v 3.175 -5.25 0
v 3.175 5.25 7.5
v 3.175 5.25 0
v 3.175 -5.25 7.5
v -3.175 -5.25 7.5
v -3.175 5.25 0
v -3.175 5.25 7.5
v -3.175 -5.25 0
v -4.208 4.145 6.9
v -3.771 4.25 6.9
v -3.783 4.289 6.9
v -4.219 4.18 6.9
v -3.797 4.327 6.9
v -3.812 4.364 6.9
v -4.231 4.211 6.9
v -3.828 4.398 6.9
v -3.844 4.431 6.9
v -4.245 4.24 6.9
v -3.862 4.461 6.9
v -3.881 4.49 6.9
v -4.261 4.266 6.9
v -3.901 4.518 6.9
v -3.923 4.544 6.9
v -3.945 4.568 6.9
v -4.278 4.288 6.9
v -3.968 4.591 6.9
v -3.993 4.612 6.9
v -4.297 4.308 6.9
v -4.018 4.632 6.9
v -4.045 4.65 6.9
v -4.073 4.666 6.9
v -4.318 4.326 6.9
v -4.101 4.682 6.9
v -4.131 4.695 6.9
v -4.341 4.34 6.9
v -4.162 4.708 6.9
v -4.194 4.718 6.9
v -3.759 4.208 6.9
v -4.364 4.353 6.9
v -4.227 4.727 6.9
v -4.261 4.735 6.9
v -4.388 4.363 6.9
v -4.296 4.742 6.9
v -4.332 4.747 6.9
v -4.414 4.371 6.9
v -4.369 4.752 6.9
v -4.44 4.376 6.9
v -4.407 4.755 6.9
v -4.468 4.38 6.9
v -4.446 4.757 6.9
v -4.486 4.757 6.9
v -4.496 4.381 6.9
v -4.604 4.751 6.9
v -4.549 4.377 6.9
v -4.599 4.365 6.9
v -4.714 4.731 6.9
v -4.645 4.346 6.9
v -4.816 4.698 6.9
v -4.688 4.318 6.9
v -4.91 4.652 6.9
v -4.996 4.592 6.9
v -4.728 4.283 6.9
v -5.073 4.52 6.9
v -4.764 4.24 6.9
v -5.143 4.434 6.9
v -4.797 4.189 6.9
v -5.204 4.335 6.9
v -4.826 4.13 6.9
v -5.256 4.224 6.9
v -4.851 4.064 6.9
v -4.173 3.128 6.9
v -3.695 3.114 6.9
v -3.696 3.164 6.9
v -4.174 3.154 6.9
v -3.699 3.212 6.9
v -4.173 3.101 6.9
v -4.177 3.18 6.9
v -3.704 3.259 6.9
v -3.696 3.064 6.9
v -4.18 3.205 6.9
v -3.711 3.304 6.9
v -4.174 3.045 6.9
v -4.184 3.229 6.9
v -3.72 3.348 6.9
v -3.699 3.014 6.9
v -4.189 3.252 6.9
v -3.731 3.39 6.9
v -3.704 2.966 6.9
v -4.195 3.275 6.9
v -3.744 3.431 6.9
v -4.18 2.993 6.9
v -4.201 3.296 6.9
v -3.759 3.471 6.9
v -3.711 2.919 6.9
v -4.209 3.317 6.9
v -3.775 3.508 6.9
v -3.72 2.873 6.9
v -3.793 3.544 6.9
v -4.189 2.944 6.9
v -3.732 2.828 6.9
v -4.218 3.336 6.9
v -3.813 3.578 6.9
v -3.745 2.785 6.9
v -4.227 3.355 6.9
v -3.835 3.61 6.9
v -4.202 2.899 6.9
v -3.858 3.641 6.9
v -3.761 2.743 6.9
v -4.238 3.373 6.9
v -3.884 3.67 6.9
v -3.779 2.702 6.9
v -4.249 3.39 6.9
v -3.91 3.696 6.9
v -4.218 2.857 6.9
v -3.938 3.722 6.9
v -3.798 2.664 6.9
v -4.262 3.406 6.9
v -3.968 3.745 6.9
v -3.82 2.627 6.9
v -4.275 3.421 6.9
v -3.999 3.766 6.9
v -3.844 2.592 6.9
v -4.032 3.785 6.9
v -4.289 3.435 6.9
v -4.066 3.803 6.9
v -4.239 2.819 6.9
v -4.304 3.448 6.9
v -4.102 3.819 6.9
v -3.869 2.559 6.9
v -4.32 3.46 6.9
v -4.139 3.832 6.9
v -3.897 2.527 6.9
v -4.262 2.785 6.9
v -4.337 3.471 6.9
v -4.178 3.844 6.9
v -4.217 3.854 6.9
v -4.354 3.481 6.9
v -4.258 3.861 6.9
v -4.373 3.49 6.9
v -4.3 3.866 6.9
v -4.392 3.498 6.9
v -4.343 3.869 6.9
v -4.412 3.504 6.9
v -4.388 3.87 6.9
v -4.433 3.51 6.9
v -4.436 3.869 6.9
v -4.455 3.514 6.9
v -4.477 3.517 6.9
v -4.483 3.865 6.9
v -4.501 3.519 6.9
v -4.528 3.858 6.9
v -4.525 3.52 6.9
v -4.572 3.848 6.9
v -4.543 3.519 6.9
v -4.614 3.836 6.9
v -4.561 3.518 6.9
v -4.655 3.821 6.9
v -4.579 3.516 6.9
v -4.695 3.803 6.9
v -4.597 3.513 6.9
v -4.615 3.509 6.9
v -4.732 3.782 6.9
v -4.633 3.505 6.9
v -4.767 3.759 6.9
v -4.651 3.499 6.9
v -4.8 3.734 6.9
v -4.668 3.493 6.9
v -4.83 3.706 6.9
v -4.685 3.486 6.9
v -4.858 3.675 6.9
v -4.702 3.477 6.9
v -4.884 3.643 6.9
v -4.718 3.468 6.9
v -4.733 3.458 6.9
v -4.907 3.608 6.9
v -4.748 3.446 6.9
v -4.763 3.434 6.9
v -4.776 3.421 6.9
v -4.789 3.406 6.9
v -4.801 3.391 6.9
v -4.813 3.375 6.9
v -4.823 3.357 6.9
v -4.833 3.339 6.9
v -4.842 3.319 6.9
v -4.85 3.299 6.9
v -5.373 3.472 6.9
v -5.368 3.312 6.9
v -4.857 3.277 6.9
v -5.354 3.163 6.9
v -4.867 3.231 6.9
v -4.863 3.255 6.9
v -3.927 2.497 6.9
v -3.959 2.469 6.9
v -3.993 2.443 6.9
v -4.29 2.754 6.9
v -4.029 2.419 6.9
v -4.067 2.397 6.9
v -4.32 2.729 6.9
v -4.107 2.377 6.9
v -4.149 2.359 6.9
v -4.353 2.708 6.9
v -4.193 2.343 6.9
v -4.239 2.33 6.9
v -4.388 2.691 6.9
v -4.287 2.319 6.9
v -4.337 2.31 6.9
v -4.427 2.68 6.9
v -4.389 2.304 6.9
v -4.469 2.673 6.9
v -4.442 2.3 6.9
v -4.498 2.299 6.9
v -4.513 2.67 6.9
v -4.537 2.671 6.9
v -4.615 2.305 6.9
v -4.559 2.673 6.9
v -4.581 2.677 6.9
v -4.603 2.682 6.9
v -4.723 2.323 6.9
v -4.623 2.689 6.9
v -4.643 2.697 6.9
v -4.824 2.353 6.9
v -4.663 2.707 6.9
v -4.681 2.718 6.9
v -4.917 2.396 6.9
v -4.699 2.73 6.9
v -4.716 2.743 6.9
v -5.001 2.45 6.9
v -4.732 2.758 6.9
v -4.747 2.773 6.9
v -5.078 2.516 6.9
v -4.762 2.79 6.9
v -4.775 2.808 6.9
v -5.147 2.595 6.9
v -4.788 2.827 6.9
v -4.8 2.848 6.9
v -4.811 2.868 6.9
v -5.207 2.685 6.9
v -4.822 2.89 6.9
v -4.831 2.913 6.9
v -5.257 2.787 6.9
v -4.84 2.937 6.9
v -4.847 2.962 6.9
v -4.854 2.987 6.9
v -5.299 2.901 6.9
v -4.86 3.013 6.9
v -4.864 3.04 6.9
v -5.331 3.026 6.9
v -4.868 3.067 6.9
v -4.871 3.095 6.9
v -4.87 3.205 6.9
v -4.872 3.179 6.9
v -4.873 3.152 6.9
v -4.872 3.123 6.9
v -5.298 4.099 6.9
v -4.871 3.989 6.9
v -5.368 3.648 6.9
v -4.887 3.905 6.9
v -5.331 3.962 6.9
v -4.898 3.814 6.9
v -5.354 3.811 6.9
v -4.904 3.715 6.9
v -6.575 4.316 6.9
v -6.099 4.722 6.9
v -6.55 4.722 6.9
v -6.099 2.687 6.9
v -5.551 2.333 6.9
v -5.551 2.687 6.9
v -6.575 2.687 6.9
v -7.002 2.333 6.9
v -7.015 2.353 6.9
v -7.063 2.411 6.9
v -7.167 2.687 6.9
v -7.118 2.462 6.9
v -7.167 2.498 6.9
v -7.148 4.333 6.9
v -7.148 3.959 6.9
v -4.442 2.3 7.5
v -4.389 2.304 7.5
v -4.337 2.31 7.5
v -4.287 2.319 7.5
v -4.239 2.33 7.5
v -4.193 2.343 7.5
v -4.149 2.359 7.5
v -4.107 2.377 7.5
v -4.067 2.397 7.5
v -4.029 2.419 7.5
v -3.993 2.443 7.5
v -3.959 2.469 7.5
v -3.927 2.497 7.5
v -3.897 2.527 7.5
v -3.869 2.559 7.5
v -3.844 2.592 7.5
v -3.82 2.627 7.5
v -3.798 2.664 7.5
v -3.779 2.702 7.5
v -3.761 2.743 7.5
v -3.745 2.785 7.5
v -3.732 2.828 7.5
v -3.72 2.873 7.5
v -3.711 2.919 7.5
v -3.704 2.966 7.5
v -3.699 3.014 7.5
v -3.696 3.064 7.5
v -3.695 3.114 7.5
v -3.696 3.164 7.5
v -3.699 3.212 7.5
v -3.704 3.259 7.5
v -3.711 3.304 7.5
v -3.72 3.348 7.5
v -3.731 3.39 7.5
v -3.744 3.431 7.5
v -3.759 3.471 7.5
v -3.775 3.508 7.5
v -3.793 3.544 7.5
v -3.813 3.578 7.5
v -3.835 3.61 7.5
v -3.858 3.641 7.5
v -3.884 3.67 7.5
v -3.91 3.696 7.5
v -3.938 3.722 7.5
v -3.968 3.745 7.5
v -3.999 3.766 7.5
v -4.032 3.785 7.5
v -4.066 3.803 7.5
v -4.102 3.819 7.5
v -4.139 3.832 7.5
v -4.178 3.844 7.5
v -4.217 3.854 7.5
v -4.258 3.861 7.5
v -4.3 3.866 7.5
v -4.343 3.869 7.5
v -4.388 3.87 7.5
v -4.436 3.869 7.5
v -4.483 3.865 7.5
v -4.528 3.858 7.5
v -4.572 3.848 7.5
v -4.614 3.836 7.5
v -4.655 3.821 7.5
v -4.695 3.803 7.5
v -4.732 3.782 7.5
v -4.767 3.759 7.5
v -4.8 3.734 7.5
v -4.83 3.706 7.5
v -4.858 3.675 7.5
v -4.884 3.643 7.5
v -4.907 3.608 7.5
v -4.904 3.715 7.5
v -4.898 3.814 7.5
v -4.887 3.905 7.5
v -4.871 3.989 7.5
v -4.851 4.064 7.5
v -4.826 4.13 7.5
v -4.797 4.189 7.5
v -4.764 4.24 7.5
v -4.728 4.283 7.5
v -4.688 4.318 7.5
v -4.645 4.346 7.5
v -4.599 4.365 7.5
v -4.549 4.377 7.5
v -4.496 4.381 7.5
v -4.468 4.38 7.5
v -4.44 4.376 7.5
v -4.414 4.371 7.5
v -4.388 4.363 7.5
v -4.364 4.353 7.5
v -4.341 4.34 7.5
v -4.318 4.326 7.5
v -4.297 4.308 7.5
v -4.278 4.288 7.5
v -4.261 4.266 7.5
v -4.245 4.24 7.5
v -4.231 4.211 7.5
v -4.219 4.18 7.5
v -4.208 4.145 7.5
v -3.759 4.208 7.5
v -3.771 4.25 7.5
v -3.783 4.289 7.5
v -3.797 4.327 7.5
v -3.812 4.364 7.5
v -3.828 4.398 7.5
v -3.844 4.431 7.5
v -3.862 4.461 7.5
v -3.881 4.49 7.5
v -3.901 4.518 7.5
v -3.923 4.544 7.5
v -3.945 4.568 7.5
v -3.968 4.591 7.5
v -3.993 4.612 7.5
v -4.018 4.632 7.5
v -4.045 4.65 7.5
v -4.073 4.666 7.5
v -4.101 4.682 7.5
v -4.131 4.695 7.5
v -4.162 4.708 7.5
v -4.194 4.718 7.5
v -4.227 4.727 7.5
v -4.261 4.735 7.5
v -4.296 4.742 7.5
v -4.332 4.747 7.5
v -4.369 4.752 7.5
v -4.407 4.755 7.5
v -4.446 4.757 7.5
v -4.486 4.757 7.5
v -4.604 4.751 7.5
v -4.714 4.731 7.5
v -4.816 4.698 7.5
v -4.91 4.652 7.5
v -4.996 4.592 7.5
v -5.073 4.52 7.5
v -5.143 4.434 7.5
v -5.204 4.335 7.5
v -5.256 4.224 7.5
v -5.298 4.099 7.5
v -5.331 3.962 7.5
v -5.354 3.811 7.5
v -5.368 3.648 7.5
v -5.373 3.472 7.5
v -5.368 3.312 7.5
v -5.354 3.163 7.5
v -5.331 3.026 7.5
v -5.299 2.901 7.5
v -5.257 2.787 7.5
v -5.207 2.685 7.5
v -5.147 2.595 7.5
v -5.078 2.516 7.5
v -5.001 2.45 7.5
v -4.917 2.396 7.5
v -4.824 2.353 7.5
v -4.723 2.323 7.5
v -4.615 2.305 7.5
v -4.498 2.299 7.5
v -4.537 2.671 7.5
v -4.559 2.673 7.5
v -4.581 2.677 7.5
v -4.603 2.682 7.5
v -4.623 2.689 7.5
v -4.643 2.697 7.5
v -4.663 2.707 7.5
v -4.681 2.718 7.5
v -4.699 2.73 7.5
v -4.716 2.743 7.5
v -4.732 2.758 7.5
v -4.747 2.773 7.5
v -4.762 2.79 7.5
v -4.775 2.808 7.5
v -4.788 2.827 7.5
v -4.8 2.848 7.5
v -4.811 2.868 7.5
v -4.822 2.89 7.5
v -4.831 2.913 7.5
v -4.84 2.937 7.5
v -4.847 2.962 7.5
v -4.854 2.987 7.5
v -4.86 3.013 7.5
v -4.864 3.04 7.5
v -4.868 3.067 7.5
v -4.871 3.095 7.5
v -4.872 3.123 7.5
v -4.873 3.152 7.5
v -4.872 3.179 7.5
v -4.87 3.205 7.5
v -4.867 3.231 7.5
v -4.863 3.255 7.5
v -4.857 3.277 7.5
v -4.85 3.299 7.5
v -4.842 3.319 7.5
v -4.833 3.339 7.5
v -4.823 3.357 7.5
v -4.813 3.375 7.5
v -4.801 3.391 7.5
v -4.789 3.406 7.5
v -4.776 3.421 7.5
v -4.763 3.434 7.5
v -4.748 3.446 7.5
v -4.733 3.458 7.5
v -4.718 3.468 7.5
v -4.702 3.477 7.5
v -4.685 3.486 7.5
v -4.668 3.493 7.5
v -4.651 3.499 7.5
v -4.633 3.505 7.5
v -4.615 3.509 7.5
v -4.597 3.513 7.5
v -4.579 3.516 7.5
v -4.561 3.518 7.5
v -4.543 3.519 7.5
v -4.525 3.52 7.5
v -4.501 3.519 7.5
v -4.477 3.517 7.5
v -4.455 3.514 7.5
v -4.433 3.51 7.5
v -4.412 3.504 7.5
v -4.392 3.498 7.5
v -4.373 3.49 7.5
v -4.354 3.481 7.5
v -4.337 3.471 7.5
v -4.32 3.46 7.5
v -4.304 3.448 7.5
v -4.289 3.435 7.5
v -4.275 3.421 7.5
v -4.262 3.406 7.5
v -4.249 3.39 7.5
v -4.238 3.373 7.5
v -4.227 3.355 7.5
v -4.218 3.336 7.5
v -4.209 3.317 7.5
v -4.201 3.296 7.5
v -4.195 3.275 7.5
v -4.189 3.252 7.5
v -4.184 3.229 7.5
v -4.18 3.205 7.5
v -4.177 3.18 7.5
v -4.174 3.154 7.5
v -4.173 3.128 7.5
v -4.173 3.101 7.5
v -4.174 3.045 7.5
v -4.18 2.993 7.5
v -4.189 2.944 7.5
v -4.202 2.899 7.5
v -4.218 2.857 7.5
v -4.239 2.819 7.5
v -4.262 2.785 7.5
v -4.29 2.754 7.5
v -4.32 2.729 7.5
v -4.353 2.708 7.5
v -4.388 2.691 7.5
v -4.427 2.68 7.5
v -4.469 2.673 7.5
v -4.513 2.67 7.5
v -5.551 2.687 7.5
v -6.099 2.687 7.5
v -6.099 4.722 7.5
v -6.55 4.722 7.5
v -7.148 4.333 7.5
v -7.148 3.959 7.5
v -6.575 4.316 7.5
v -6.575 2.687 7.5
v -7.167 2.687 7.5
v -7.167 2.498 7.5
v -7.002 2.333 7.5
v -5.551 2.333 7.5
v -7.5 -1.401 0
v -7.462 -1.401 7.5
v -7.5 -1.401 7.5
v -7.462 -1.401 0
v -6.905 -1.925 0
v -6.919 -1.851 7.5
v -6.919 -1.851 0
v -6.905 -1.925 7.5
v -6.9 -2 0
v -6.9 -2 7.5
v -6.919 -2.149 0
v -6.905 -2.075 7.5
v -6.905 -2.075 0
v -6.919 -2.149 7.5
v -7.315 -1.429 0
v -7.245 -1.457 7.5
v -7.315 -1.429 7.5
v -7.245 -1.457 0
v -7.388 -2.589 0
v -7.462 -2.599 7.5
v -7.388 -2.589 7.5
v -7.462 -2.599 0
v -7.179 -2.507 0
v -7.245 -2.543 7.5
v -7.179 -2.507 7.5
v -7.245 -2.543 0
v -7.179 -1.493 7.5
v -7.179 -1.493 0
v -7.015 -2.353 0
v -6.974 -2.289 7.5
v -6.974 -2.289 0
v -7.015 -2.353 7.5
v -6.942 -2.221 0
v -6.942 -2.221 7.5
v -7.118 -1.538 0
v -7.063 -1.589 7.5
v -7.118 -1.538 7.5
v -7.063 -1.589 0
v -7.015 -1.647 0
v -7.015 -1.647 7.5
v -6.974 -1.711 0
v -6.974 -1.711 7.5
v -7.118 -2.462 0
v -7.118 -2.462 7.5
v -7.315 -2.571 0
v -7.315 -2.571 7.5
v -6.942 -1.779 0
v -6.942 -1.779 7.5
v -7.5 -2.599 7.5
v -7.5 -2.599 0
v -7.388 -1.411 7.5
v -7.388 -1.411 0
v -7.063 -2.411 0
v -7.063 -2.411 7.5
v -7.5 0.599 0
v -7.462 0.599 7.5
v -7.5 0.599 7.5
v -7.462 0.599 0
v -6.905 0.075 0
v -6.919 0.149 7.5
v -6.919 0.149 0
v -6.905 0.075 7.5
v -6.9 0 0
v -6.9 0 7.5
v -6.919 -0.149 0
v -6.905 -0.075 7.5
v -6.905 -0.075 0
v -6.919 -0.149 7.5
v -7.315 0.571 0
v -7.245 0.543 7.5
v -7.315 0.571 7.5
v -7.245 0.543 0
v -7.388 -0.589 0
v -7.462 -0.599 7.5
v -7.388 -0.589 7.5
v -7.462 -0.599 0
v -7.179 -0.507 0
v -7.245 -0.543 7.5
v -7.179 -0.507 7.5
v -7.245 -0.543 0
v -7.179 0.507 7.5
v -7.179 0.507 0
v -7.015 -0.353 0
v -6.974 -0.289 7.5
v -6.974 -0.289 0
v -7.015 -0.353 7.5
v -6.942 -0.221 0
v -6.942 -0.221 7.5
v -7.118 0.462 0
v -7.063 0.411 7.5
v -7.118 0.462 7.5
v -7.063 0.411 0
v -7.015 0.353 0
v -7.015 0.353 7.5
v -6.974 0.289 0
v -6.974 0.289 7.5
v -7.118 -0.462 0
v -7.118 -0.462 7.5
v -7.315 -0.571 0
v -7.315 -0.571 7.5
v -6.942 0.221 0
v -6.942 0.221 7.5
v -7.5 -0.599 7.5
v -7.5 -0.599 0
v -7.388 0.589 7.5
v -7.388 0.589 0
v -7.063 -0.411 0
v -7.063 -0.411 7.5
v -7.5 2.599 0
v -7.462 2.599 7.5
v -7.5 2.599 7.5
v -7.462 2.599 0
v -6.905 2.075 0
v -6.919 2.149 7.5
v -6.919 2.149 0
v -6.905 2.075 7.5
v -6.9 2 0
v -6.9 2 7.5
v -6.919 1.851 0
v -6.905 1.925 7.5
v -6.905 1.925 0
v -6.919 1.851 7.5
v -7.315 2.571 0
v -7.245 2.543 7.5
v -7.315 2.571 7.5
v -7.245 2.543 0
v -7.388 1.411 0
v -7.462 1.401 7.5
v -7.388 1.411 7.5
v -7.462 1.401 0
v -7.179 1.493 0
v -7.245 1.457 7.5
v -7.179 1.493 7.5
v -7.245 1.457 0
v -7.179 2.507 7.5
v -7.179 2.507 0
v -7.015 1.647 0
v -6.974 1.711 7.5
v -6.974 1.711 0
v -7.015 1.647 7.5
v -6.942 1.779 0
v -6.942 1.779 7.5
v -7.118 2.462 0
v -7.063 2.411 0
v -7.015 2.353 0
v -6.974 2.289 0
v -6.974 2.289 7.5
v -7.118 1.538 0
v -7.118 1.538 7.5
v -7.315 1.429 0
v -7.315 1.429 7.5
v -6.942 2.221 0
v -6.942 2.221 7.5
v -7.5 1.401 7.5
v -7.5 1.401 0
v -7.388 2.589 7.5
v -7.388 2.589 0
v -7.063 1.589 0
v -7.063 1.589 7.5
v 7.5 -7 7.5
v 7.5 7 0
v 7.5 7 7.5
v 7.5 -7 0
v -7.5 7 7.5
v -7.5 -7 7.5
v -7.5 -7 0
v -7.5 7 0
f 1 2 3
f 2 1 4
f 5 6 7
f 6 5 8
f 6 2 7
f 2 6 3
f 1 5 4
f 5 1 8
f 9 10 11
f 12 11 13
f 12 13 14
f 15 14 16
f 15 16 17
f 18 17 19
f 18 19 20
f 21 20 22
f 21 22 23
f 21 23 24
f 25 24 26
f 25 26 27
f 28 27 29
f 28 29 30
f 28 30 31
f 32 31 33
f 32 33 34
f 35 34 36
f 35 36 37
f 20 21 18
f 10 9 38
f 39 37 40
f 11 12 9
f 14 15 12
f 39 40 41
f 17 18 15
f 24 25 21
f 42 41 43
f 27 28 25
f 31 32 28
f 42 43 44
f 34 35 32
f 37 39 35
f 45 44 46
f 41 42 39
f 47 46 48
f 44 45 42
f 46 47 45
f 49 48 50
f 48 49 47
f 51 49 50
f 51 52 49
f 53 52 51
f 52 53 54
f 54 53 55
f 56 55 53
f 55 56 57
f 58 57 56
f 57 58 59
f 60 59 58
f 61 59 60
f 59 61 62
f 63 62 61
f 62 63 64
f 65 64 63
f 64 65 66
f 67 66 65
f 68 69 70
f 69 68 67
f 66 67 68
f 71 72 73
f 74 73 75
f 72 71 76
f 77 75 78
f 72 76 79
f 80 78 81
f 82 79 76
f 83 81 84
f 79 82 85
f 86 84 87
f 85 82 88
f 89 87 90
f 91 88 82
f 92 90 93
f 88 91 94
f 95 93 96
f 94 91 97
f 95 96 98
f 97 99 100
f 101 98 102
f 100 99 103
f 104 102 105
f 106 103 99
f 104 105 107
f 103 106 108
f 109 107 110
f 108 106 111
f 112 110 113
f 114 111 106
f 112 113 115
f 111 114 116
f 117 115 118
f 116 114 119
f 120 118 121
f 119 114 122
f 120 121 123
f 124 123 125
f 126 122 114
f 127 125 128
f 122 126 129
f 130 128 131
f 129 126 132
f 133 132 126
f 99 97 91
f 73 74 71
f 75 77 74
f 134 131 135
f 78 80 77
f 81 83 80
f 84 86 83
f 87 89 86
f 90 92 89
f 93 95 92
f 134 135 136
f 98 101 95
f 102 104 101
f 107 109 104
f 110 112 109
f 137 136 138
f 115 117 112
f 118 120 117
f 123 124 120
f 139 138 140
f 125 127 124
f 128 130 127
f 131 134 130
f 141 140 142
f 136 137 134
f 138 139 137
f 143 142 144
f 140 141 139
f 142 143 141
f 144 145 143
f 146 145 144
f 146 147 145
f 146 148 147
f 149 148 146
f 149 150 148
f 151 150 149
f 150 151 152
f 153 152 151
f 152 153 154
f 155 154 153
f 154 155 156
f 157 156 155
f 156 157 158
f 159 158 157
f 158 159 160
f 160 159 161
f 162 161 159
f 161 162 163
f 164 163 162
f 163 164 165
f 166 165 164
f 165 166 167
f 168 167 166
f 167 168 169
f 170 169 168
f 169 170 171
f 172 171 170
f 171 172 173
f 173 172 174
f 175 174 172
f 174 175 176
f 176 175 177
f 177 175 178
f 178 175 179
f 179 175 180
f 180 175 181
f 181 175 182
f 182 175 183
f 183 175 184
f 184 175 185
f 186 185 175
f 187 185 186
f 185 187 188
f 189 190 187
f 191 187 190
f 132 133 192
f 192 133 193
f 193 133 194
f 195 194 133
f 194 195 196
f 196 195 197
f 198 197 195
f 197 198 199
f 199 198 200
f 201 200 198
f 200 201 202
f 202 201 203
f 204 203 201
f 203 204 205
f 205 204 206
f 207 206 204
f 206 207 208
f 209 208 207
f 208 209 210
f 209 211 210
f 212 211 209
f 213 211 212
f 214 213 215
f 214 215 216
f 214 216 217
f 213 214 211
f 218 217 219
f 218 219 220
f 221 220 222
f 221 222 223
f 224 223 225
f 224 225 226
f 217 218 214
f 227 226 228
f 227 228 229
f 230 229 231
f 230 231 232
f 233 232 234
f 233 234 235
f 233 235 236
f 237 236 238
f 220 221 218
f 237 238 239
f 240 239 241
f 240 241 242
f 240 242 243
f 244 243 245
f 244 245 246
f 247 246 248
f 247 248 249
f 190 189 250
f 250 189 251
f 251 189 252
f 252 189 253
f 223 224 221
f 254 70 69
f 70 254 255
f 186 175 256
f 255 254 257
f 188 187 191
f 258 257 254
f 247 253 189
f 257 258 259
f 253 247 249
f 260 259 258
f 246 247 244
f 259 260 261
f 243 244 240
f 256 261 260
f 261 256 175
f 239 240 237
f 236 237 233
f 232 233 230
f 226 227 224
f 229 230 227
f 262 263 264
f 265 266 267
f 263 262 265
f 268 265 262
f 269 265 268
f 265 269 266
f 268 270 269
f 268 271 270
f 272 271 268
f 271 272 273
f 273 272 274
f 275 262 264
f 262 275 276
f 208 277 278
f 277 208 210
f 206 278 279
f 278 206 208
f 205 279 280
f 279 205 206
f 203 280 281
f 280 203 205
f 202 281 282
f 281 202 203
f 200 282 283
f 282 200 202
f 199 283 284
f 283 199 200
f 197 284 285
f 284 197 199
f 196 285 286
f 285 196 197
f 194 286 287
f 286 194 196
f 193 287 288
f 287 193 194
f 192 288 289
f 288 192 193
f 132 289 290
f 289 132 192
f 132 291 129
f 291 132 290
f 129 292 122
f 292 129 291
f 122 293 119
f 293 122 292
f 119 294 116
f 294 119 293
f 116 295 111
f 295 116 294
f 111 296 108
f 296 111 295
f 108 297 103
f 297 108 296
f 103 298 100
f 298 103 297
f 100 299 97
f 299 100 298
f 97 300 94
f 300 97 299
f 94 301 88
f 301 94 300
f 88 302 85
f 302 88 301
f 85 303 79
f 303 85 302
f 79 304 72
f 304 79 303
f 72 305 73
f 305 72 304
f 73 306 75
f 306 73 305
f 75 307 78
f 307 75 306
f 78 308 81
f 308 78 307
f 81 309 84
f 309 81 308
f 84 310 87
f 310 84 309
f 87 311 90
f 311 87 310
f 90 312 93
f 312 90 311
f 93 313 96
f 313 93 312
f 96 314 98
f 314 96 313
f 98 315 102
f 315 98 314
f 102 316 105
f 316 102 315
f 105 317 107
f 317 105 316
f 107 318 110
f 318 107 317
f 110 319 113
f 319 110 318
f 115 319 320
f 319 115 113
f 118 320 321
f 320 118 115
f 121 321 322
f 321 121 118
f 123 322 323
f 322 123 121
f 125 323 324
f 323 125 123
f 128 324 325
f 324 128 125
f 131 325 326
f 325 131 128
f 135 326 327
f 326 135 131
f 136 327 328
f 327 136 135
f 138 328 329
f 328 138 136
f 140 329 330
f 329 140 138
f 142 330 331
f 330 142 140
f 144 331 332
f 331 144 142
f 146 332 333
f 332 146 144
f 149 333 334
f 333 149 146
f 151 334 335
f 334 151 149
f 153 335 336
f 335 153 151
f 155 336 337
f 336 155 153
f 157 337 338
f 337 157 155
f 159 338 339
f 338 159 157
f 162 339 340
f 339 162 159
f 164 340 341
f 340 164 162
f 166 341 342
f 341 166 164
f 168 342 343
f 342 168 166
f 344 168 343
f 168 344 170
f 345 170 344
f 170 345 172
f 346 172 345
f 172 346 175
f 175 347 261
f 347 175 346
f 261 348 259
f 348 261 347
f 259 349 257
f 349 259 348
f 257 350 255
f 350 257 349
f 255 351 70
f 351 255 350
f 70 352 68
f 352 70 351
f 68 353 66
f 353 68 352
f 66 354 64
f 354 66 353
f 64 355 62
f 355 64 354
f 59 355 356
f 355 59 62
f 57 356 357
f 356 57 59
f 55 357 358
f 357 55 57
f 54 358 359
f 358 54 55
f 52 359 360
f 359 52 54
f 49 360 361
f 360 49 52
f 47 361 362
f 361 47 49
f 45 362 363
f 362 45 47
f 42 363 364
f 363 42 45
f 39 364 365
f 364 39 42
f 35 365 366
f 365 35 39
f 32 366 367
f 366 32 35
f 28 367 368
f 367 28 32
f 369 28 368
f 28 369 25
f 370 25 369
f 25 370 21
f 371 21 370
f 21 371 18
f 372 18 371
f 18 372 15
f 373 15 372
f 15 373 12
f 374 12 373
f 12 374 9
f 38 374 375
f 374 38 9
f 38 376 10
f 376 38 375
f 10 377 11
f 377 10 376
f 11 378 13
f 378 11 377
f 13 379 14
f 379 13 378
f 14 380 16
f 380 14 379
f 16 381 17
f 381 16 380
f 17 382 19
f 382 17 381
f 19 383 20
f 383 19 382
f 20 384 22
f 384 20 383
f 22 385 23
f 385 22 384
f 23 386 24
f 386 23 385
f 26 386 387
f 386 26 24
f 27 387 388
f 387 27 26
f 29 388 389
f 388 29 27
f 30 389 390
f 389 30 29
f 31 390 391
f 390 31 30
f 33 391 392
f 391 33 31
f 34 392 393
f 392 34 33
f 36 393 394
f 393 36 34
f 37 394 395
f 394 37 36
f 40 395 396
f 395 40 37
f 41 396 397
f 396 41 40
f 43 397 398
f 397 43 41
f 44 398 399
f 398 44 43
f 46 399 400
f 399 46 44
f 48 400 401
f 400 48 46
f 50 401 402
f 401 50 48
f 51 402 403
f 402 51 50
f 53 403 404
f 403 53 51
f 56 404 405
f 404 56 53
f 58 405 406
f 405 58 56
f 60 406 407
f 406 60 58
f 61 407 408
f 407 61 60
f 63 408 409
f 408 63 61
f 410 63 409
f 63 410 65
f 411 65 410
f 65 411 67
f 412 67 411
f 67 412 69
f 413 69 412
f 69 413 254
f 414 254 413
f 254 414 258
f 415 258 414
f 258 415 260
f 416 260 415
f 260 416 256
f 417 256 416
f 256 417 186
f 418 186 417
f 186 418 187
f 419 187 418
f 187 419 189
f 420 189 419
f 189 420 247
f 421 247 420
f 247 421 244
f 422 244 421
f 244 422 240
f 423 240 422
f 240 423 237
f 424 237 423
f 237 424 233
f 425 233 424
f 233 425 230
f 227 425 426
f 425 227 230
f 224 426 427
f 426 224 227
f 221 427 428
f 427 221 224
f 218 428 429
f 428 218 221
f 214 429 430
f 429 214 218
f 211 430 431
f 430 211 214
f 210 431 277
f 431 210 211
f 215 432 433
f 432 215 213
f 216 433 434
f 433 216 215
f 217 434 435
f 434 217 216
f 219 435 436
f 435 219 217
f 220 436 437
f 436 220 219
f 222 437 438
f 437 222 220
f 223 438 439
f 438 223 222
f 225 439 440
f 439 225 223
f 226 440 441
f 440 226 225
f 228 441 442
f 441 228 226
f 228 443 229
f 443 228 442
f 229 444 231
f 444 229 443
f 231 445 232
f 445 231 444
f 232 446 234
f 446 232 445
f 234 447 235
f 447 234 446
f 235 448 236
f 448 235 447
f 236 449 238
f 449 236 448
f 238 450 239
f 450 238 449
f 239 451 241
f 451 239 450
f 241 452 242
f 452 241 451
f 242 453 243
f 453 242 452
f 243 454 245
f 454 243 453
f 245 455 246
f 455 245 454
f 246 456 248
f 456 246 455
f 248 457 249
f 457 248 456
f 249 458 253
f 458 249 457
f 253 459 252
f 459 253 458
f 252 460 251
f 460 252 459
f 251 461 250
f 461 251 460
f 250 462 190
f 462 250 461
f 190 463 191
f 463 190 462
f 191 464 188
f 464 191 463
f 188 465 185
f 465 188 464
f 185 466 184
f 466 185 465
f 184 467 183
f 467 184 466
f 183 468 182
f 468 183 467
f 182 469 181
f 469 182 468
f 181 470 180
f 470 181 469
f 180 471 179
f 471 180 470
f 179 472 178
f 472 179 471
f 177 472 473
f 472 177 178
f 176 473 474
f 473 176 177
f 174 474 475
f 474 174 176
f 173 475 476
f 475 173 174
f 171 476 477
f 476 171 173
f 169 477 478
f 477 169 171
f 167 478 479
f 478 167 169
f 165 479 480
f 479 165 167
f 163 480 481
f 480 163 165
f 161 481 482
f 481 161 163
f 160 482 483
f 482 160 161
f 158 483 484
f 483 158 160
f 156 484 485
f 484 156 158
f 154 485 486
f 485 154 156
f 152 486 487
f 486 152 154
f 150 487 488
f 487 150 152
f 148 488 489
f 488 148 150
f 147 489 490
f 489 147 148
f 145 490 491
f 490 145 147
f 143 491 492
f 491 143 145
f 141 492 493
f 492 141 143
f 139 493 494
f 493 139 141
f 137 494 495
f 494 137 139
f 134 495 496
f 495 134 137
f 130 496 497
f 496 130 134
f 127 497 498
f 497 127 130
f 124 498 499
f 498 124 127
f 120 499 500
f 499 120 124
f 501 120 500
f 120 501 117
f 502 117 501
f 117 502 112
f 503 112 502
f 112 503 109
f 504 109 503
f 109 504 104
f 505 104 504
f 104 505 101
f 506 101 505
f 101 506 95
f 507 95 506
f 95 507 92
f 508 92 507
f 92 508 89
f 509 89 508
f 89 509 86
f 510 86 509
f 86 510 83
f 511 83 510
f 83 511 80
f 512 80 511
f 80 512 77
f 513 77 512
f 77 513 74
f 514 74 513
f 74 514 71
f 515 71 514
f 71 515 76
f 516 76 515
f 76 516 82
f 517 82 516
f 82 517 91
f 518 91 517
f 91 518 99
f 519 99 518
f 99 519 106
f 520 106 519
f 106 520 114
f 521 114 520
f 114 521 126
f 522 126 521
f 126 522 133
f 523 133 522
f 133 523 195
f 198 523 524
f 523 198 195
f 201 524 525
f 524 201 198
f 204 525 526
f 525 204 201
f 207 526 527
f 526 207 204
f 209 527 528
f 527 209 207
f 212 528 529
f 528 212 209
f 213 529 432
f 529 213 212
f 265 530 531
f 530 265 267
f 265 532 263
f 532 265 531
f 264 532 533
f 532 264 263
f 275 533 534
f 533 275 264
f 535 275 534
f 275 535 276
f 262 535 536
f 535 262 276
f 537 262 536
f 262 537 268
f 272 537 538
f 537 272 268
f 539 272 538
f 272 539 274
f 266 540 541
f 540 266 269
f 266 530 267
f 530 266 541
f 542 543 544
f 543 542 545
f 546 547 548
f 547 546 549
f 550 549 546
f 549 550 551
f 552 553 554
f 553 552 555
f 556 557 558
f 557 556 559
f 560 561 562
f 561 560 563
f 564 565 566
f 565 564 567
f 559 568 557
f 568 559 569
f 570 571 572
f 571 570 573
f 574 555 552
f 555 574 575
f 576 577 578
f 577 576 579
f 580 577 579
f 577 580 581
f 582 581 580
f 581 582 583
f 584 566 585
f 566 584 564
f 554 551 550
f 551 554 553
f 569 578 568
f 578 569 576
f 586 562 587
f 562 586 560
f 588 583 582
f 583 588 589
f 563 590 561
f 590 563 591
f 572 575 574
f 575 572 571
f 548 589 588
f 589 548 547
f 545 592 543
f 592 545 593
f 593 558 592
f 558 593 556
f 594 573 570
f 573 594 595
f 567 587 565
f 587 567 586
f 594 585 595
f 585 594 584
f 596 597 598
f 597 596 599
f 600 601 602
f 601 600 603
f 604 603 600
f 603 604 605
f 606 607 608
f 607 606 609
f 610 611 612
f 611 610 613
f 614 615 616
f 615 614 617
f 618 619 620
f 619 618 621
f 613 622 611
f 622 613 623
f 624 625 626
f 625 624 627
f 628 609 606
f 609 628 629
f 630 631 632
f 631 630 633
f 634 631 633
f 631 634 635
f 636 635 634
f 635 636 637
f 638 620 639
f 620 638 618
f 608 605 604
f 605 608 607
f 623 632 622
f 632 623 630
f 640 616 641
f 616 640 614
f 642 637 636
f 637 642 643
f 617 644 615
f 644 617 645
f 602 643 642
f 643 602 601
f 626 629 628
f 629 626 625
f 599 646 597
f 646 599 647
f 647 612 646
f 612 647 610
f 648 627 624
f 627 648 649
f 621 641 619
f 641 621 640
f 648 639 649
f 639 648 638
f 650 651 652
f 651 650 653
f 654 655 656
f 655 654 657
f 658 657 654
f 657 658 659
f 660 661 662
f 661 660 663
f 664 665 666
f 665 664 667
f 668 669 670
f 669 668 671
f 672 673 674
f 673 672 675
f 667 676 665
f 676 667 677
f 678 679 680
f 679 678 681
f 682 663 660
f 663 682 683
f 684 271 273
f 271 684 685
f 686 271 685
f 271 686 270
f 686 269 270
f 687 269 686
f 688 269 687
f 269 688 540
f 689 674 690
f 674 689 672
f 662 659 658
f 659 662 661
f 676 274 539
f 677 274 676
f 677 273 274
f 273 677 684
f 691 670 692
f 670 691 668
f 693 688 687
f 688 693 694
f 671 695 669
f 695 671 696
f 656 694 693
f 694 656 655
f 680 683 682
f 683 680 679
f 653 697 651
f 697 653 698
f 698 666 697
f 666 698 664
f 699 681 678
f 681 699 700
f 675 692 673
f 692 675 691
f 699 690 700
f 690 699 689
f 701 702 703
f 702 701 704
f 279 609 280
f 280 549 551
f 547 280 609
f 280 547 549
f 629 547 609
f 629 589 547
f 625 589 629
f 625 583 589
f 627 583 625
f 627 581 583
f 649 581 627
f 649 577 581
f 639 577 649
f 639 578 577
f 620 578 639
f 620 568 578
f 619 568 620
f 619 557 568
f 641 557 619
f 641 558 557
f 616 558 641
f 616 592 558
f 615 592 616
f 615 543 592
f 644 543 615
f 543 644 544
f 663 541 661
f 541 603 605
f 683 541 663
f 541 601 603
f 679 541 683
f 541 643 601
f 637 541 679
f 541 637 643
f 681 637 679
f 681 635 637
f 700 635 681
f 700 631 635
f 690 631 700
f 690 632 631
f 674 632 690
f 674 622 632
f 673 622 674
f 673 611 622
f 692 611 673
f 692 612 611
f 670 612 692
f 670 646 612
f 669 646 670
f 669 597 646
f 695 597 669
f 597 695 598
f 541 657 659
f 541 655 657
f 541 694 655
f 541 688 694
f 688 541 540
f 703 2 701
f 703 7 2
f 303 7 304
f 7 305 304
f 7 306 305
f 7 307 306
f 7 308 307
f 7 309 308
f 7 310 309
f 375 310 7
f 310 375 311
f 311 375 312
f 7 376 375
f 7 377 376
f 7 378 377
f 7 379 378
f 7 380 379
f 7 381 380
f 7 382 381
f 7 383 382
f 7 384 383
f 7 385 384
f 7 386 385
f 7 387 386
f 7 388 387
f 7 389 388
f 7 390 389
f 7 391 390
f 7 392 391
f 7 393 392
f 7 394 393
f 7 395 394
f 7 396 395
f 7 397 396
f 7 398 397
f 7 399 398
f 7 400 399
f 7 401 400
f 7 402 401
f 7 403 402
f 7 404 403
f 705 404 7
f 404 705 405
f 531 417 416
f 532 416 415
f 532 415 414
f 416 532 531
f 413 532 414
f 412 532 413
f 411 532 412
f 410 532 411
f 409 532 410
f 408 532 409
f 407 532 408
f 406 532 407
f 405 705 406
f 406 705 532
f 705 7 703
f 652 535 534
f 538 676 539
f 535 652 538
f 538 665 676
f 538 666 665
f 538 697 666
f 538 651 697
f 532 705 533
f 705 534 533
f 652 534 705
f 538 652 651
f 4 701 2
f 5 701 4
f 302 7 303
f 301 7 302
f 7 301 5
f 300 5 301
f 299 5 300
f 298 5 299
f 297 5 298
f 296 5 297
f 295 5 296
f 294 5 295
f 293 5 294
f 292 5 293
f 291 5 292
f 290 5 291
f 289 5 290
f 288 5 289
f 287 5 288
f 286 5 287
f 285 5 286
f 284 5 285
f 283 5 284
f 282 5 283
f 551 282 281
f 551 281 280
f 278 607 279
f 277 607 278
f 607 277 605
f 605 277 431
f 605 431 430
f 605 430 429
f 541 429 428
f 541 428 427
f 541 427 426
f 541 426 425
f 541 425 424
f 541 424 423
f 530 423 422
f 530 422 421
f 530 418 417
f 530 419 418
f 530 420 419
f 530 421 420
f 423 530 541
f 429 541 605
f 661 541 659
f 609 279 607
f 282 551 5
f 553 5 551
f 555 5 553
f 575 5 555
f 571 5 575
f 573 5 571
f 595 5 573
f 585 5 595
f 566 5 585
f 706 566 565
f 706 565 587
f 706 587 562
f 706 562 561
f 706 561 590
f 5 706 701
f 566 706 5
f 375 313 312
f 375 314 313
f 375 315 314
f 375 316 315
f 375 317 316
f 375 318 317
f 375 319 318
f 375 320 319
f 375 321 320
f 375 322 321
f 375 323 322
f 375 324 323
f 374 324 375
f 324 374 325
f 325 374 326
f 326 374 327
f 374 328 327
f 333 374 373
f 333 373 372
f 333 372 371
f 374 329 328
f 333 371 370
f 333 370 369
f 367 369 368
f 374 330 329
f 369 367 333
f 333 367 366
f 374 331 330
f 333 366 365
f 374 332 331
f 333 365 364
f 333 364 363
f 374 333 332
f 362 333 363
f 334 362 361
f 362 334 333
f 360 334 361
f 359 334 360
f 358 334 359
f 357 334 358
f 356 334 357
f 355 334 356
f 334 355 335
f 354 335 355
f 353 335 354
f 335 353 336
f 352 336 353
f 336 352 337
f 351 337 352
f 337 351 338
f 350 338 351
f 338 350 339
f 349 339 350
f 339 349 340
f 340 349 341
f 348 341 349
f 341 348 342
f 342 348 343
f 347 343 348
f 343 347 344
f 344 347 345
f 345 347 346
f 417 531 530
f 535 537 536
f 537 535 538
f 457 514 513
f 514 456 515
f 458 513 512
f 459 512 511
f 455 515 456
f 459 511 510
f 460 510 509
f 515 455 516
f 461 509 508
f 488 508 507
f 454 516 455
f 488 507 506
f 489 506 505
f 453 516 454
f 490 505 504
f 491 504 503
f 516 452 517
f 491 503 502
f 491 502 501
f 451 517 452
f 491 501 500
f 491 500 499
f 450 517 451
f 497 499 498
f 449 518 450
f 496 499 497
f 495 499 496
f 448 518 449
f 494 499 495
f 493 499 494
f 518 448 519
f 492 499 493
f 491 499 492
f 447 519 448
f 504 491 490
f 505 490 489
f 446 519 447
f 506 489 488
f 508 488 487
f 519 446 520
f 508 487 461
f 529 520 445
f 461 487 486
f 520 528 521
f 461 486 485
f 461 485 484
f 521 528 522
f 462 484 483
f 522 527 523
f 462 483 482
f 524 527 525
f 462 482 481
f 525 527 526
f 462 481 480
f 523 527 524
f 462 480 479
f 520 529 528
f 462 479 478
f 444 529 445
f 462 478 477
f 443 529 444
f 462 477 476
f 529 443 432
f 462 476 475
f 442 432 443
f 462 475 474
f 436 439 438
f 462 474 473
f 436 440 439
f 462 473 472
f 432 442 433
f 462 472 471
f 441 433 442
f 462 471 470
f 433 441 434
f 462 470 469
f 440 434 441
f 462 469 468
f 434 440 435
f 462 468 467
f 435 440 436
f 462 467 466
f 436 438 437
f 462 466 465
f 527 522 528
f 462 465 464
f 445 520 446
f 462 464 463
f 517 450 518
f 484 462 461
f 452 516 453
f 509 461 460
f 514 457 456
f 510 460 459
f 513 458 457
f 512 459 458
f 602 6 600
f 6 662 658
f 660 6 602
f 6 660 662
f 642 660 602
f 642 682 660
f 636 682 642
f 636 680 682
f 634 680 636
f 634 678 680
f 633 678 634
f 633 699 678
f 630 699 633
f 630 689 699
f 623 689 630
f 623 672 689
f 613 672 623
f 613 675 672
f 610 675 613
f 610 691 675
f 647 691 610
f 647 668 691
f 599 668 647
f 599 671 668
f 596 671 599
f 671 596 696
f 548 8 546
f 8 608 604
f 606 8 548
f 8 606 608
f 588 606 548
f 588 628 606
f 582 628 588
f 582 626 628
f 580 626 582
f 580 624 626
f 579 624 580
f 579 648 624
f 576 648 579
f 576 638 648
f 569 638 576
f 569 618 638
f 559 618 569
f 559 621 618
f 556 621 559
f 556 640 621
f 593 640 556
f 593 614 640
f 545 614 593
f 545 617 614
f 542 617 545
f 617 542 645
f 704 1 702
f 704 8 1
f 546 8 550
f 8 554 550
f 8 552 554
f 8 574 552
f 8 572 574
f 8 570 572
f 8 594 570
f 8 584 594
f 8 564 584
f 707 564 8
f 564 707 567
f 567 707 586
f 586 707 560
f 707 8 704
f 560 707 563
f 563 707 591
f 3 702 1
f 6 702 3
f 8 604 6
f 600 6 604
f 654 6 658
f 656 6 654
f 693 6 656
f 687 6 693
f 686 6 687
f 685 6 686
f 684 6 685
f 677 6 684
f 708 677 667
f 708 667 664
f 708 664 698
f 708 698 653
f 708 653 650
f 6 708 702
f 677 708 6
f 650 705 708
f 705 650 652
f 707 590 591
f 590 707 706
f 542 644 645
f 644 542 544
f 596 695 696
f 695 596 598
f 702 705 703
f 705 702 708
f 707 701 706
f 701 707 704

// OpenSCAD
$fn = 50;

difference() {
	union() {
		translate(v = [0, -5, 0]) {
			rotate(a = [0, 0, 0]) {
				difference() {
					union() {
						translate(v = [-7.5, -2.0, 0]) {
							cube(size = [15.0, 14.0, 7.5]);
						}
					}
					union() {
						translate(v = [-3.175, -0.25, -0.1]) {
							cube(size = [6.35, 10.5, 7.7]);
						}
						translate(v = [-5.5, 8.5, 6.9]) {
							linear_extrude(height = 0.7) {
								text(font = "Arial:style=Bold", halign = "center", size = 2.5, text = "16", valign = "center");
							}
						}
						translate(v = [-7.5, 3, -0.1]) {
							cylinder(h = 7.7, r = 0.6);
						}
						translate(v = [-7.5, 5, -0.1]) {
							cylinder(h = 7.7, r = 0.6);
						}
						translate(v = [-7.5, 7, -0.1]) {
							cylinder(h = 7.7, r = 0.6);
						}
					}
				}
			}
		}
	}
	union();
}
